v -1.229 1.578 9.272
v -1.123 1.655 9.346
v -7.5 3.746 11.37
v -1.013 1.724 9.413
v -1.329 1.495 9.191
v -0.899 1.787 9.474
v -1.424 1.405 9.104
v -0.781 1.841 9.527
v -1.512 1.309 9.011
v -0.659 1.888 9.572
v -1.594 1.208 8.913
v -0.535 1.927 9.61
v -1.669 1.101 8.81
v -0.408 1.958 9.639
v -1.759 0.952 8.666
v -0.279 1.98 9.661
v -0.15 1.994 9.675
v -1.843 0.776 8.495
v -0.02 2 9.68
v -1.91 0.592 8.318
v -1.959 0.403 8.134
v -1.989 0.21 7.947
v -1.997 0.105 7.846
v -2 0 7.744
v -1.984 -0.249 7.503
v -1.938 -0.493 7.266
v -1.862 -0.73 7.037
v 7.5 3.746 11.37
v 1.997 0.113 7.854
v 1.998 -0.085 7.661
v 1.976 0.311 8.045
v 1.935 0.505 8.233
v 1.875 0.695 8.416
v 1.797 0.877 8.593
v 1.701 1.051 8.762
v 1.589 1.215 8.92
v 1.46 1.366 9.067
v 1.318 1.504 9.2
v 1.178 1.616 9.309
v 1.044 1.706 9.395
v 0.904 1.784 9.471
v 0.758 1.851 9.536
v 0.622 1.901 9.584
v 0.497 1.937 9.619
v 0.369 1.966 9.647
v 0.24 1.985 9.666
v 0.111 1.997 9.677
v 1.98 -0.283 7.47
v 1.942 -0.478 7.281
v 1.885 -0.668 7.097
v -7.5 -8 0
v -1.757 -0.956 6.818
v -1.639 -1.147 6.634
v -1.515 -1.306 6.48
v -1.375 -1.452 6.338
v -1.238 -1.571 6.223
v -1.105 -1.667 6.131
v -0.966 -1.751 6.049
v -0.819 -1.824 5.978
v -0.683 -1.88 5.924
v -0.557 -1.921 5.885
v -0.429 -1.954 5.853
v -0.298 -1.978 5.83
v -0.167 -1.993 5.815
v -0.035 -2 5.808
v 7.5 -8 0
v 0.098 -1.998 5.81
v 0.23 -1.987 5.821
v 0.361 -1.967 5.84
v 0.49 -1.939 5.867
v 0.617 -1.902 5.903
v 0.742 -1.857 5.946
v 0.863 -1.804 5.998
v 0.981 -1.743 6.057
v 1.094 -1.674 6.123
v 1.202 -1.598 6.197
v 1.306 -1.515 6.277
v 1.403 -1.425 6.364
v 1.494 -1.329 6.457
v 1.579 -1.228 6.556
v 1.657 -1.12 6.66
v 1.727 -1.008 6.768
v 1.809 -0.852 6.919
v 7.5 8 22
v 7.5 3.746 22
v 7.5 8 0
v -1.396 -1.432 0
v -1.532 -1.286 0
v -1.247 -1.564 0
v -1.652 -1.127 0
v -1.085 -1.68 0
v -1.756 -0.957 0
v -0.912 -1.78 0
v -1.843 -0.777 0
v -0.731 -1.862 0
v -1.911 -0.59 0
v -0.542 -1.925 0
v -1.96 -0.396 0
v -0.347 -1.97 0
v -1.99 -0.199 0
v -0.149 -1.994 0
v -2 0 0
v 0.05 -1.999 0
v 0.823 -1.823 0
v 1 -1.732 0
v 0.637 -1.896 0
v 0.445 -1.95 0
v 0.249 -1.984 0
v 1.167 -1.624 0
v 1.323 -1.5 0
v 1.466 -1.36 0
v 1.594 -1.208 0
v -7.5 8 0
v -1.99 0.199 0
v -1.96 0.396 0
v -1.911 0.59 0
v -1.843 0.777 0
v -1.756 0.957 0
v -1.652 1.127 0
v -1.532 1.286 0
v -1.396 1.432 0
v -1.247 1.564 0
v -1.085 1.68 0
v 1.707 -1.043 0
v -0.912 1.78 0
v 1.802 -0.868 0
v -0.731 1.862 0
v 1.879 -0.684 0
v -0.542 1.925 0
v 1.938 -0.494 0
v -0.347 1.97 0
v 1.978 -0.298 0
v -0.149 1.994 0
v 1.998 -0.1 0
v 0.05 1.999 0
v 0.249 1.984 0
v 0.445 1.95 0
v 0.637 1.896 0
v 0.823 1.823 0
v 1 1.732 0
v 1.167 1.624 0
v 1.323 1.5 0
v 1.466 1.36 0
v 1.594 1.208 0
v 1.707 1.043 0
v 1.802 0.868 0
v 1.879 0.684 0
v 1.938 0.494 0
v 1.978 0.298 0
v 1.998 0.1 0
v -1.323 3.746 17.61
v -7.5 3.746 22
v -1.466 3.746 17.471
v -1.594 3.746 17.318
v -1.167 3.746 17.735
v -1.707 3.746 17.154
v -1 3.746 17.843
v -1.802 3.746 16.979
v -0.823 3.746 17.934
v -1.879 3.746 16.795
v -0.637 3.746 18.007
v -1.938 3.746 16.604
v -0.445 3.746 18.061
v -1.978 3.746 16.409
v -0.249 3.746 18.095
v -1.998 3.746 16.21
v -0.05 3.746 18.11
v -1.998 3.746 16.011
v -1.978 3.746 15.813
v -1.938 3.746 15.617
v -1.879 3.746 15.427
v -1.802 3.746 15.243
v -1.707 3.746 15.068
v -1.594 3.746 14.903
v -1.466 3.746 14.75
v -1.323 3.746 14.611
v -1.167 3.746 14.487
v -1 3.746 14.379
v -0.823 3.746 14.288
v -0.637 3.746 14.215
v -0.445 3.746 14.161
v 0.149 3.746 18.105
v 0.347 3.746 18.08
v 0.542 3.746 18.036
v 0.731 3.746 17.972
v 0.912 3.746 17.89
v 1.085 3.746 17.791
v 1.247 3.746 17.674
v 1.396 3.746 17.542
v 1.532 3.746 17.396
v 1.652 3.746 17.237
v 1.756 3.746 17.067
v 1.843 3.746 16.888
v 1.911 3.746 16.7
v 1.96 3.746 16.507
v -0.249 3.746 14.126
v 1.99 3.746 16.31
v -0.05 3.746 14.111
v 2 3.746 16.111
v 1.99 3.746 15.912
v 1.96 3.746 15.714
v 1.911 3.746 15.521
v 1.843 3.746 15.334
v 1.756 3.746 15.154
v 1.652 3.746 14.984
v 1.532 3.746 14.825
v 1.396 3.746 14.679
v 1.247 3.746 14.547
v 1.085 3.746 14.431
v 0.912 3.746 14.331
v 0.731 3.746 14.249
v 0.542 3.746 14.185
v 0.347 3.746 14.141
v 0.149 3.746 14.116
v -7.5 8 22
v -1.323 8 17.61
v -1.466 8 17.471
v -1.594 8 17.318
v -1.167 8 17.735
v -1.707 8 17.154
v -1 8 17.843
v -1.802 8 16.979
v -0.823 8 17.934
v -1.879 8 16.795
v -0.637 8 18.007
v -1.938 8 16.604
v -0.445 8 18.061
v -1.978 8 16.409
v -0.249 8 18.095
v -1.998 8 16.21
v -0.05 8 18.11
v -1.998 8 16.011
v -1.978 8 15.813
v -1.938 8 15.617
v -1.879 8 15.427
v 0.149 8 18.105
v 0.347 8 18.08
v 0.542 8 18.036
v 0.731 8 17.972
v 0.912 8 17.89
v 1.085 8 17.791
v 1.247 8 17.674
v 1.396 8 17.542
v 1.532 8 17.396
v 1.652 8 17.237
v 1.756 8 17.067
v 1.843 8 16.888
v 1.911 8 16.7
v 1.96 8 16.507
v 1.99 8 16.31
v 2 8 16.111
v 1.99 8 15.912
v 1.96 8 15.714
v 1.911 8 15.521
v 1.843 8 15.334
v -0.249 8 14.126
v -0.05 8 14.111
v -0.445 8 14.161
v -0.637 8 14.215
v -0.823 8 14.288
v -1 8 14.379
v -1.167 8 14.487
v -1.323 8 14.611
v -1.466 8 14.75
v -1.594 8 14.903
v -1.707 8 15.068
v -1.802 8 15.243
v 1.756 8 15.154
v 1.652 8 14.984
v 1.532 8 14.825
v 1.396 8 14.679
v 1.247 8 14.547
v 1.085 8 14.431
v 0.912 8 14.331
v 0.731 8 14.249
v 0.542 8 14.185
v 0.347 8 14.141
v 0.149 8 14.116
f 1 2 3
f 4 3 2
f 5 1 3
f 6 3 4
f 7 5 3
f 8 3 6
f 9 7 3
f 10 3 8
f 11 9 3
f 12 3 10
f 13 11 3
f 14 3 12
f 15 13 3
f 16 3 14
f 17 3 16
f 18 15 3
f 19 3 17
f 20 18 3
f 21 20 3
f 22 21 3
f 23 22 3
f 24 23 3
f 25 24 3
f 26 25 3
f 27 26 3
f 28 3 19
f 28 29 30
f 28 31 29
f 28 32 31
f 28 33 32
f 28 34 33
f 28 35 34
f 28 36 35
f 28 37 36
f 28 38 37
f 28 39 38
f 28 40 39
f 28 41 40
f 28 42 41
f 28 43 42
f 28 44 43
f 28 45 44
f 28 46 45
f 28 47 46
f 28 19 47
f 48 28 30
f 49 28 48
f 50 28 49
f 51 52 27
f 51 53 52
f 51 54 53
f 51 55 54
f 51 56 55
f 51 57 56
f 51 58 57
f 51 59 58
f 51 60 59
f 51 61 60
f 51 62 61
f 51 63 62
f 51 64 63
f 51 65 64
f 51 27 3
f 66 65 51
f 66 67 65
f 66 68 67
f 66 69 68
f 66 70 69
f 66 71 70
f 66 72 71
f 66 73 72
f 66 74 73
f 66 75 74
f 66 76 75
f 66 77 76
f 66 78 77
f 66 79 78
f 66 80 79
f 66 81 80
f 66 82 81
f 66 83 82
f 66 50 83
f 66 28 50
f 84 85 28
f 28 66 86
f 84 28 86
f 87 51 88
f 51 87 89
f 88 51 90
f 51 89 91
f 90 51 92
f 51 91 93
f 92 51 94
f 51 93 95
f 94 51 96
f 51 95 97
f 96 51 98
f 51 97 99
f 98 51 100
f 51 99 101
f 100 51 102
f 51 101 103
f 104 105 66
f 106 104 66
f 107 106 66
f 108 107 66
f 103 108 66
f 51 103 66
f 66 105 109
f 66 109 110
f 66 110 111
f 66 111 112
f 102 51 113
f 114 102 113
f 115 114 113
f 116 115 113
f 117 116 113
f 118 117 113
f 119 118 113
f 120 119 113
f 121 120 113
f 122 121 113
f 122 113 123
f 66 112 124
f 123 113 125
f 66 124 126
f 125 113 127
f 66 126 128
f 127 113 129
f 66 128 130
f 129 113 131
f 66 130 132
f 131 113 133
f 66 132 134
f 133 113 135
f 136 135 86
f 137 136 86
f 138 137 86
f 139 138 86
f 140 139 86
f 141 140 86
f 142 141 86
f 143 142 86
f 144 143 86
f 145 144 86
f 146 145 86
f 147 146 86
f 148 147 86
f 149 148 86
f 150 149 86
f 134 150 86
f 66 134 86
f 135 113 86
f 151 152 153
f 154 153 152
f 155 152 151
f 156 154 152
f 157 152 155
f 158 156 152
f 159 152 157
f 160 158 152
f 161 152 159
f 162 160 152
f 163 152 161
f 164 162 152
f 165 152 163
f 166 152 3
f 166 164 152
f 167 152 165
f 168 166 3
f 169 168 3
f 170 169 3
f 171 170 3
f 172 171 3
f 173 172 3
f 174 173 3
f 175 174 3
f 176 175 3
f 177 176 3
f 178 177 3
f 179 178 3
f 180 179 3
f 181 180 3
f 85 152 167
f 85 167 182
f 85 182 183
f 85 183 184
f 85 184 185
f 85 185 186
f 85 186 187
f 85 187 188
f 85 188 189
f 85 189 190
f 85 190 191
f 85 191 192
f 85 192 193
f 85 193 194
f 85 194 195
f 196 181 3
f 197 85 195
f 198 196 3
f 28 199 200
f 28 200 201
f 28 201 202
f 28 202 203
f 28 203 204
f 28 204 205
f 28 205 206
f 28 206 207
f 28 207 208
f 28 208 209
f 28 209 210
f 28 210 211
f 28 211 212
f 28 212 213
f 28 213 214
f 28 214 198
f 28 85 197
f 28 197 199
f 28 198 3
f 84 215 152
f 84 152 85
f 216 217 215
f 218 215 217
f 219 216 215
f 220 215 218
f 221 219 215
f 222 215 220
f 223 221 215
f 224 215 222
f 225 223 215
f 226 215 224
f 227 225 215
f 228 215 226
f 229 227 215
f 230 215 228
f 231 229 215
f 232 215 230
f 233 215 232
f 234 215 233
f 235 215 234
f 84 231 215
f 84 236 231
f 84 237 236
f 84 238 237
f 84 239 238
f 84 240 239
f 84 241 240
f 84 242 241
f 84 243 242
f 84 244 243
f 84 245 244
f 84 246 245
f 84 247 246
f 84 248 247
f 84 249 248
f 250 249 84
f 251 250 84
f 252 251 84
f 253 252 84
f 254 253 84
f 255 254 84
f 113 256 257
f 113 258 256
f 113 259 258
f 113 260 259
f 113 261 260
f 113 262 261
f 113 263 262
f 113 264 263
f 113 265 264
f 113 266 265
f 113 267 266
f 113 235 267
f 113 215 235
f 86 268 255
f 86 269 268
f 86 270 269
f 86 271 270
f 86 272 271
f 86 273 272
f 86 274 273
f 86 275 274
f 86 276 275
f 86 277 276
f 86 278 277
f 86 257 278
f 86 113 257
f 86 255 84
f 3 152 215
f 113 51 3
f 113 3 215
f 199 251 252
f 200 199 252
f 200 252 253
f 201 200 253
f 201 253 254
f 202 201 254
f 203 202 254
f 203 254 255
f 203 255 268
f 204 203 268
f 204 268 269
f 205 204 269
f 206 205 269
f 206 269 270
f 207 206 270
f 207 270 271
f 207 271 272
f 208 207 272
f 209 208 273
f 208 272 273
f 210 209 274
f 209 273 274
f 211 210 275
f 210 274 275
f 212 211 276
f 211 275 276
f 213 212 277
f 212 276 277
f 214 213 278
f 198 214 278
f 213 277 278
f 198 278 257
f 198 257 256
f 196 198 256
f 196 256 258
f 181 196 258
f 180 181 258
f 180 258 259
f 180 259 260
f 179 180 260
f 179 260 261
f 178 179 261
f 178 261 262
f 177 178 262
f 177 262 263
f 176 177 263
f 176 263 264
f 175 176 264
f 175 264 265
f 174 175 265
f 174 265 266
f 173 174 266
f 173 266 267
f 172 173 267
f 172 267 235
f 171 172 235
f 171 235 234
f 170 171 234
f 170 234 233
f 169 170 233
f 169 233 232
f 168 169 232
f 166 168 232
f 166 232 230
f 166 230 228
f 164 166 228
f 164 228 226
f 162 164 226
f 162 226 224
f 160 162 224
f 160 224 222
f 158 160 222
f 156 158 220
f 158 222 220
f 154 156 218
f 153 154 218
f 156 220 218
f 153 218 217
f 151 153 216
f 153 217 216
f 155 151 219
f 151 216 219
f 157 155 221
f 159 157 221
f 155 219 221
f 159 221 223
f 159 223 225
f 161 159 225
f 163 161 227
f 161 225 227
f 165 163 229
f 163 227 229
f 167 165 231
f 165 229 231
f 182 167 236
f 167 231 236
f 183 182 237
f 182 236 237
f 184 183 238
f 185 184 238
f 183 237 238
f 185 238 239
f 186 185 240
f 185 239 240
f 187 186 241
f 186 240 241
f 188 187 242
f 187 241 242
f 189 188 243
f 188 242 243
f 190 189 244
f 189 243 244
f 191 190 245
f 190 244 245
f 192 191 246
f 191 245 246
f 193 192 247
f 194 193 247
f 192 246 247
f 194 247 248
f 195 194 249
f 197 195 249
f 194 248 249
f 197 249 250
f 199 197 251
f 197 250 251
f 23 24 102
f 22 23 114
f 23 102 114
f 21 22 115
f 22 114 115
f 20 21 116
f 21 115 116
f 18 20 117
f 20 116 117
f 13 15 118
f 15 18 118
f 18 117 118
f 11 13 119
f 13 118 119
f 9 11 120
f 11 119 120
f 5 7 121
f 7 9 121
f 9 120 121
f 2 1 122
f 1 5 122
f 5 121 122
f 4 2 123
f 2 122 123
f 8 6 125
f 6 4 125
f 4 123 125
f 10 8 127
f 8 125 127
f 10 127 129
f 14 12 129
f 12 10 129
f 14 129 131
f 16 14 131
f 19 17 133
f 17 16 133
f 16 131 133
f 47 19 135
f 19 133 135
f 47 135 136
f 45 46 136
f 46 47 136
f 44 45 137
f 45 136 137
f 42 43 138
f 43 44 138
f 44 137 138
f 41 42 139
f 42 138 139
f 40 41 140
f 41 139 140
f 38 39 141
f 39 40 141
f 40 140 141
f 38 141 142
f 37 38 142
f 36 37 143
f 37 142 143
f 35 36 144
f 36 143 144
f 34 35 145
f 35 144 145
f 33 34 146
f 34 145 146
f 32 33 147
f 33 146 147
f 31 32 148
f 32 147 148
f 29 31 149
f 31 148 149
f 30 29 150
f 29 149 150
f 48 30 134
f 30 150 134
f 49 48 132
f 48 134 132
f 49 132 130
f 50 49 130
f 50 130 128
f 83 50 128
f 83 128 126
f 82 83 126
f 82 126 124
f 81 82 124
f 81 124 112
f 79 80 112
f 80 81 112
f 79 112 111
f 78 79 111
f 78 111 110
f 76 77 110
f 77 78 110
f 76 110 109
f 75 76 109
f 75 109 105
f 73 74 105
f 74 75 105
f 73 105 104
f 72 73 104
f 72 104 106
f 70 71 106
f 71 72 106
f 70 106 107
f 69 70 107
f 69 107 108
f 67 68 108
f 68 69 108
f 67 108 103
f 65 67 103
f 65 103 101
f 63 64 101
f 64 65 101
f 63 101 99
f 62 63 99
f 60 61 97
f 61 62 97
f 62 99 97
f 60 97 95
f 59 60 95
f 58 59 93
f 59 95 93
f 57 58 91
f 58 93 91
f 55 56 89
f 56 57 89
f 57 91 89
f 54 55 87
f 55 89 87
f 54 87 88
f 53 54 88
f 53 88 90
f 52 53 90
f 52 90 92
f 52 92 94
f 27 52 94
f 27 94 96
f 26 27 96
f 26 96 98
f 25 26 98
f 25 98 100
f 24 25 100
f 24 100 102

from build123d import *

# Parameters (mm, degrees)
SKETCH1_W               = 15
SKETCH1_H               = 16
BOSS_EXTRUDE1_DEPTH     = 22
CUT_EXTRUDE1_DEPTH      = 22
CUT_EXTRUDE1_DEPTH_BACK = 22
SKETCH6_R               = 2
CUT_EXTRUDE2_DEPTH      = 22
SKETCH7_R               = 2
CUT_EXTRUDE3_DEPTH      = 10


with BuildPart() as part:
    # Sketch1 → Boss-Extrude1 (new body)
    with BuildSketch(Plane.XY):
        Rectangle(SKETCH1_W, SKETCH1_H)
    extrude(amount=BOSS_EXTRUDE1_DEPTH)

    # Sketch4 → Cut-Extrude1 (cut, two sides)
    with BuildSketch(Plane(origin=(0, 0, 0), x_dir=(0, 0, -1), z_dir=(1, 0, 0))) as cut_extrude1_sk:
        Polygon((-22, 3.745733089), (-11.369948947, 3.745733089), (0, -8), (-22, -8), align=None)
    extrude(amount=CUT_EXTRUDE1_DEPTH, mode=Mode.SUBTRACT)
    extrude(cut_extrude1_sk.sketch, amount=-CUT_EXTRUDE1_DEPTH_BACK, mode=Mode.SUBTRACT)

    # Sketch6 → Cut-Extrude2 (cut)
    with BuildSketch(Plane(origin=(0, 8, 0), x_dir=(1, 0, 0), z_dir=(0, 1, 0))):
        with Locations((0, -16.110735895)):
            Circle(SKETCH6_R)
    extrude(amount=-CUT_EXTRUDE2_DEPTH, mode=Mode.SUBTRACT)

    # Sketch7 → Cut-Extrude3 (cut)
    with BuildSketch(Plane(origin=(0, 0, 0), x_dir=(-1, 0, 0), z_dir=(0, 0, -1))):
        Circle(SKETCH7_R)
    extrude(amount=-CUT_EXTRUDE3_DEPTH, mode=Mode.SUBTRACT)


solid = part.part
